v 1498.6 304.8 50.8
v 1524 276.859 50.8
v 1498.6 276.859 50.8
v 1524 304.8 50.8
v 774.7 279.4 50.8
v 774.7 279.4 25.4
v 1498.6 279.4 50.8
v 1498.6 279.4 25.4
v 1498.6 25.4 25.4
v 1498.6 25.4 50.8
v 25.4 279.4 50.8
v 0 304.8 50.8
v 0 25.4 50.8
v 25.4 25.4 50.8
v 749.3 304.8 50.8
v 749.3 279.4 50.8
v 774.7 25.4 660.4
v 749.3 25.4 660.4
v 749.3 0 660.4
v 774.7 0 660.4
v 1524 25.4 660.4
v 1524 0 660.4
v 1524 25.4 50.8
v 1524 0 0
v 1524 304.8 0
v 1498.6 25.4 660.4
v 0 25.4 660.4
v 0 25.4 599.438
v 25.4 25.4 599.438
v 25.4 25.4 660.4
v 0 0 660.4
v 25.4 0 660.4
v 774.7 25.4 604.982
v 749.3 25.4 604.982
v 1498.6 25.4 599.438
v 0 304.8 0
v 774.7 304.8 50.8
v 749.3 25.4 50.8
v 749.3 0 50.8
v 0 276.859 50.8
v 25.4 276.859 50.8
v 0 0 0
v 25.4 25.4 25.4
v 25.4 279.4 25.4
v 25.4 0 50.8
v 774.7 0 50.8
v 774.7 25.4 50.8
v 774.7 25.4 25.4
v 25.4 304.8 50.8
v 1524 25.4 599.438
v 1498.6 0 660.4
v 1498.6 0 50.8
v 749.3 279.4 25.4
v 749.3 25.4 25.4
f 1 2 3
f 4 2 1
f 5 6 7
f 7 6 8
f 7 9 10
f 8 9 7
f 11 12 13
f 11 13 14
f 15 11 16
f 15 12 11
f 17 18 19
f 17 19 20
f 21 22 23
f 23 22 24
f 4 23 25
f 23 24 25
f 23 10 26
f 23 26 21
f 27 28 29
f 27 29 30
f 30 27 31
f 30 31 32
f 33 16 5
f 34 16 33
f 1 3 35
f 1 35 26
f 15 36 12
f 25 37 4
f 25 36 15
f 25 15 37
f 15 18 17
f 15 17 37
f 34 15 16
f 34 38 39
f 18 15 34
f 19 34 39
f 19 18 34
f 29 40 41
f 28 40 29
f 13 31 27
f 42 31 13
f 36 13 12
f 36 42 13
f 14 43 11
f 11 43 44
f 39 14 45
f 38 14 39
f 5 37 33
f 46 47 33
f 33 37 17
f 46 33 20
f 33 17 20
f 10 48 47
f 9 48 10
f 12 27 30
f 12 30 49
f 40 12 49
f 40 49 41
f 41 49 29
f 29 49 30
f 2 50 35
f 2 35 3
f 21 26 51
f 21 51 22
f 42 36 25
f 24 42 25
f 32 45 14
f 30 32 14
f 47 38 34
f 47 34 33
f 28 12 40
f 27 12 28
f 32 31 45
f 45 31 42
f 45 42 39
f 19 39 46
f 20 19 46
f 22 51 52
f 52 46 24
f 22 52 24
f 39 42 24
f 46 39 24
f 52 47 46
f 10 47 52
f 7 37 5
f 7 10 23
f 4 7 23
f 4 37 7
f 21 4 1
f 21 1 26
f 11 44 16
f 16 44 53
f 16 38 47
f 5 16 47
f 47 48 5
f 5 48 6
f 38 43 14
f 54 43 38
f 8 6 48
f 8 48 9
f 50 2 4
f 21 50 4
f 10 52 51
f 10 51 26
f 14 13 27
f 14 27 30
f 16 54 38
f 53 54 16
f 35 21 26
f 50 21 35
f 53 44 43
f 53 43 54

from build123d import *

# Parameters (mm, degrees)
F0_W      = 1524
F0_H      = 304.8
F1_DEPTH  = 25.4
F2_W      = 1524
F2_H      = 304.8
F2_W_2    = 723.9
F2_H_2    = 254
F3_DEPTH  = 25.4
F4_W      = 25.4
F4_H      = 25.4
F5_DEPTH  = 609.6
F7_DEPTH  = 25.4
F9_DEPTH  = 25.4
F11_DEPTH = 25.4


with BuildPart() as f1:
    # F0 (on Top) → F1 (new body)
    with BuildSketch(Plane.XY):
        with Locations((762, 152.4)):
            Rectangle(F0_W, F0_H)
    extrude(amount=F1_DEPTH)

    # F2 (on face) → F3 (join)
    with BuildSketch(Plane.XY.offset(25.4)):
        with Locations((762, 152.4)):
            Rectangle(F2_W, F2_H)
        with Locations((387.35, 152.4)):
            Rectangle(F2_W_2, F2_H_2, mode=Mode.SUBTRACT)
        with Locations((1136.65, 152.4)):
            Rectangle(F2_W_2, F2_H_2, mode=Mode.SUBTRACT)
    extrude(amount=F3_DEPTH)

    # F4 (on face) → F5 (join)
    with BuildSketch(Plane.XY.offset(50.8)):
        with Locations((12.7, 12.7)):
            Rectangle(F4_W, F4_H)
        with Locations((762, 12.7)):
            Rectangle(F4_W, F4_H)
        with Locations((1511.3, 12.7)):
            Rectangle(F4_W, F4_H)
    extrude(amount=F5_DEPTH)

    # F8 (on face) → F9 (join)
    with BuildSketch(Plane(origin=(749.3, 0, 0), x_dir=(0, -1, 0), z_dir=(-1, 0, 0))):
        Polygon((-25.4, 604.981818), (-25.4, 660.4), (-304.8, 50.8), (-279.4, 50.8), align=None)
    extrude(amount=-F9_DEPTH)


with BuildPart() as f7:
    # F6 (on face) → F7 (new body)
    with BuildSketch(Plane(origin=(0, 0, 0), x_dir=(0, -1, 0), z_dir=(-1, 0, 0))):
        Polygon((-25.4, 599.438251), (-25.4, 660.4), (-304.8, 50.8), (-276.859198, 50.8), align=None)
    extrude(amount=-F7_DEPTH)


with BuildPart() as f11:
    # F10 (on face) → F11 (new body)
    with BuildSketch(Plane.YZ.offset(1524)):
        Polygon((276.859198, 50.8), (304.8, 50.8), (25.4, 660.4), (25.4, 599.438251), align=None)
    extrude(amount=-F11_DEPTH)


solid = Compound([f1.part, f7.part, f11.part])
